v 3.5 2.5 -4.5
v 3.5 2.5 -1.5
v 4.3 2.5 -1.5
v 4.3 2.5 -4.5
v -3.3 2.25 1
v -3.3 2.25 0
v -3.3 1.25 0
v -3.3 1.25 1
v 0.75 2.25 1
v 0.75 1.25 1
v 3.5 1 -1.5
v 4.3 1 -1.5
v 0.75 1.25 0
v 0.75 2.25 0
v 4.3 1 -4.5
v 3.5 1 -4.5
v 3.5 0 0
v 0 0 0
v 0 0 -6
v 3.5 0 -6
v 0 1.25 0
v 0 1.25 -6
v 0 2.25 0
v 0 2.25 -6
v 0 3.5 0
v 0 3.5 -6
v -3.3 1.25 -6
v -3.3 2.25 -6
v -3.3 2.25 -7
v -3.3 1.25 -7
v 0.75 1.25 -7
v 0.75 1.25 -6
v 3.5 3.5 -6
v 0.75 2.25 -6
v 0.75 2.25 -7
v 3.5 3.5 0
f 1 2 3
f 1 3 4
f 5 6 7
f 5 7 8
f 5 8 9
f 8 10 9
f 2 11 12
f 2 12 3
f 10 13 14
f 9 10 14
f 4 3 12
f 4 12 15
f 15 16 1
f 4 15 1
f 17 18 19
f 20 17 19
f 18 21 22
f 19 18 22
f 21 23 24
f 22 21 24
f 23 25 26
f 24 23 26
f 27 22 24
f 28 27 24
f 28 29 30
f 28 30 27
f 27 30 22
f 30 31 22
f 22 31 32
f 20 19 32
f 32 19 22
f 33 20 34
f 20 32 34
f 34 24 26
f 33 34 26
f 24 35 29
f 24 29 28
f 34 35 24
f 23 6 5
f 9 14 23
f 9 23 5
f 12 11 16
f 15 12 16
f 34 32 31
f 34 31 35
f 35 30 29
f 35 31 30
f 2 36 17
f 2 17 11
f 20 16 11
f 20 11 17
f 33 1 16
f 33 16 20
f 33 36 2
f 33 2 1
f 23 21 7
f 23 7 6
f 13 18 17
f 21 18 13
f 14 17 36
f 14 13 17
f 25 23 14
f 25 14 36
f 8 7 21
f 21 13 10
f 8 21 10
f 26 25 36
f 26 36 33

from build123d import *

# Parameters (mm, degrees)
SKETCH1_W            = 6
SKETCH1_H            = 3.5
BOSS_EXTRUDE1_DEPTH  = 3.5
SKETCH2_W            = 3
SKETCH2_H            = 1.5
BOSS_EXTRUDE2_DEPTH  = 0.8
SKETCH7_W            = 0.75
SKETCH7_H            = 1
BOSS_EXTRUDE7_DEPTH  = 1
SKETCH8_W            = 1
SKETCH8_H            = 1
BOSS_EXTRUDE8_DEPTH  = 3.3
SKETCH9_W            = 0.75
SKETCH9_H            = 1
BOSS_EXTRUDE9_DEPTH  = 1
SKETCH10_W           = 1
SKETCH10_H           = 1
BOSS_EXTRUDE10_DEPTH = 3.3


with BuildPart() as part:
    # Sketch1 → Boss-Extrude1 (new body)
    with BuildSketch(Plane(origin=(0, 0, 0), x_dir=(0, 0, -1), z_dir=(1, 0, 0))):
        with Locations((3, 1.75)):
            Rectangle(SKETCH1_W, SKETCH1_H)
    extrude(amount=BOSS_EXTRUDE1_DEPTH)

    # Sketch2 → Boss-Extrude2 (add)
    with BuildSketch(Plane(origin=(3.5, 0, 0), x_dir=(0, 0, -1), z_dir=(1, 0, 0))):
        with Locations((3, 1.75)):
            Rectangle(SKETCH2_W, SKETCH2_H)
    extrude(amount=BOSS_EXTRUDE2_DEPTH)

    # Sketch7 → Boss-Extrude7 (add)
    with BuildSketch(Plane.XY):
        with Locations((0.375, 1.75)):
            Rectangle(SKETCH7_W, SKETCH7_H)
    extrude(amount=BOSS_EXTRUDE7_DEPTH)

    # Sketch8 → Boss-Extrude8 (add)
    with BuildSketch(Plane.ZY):
        with Locations((0.5, 1.75)):
            Rectangle(SKETCH8_W, SKETCH8_H)
    extrude(amount=BOSS_EXTRUDE8_DEPTH)

    # Sketch9 → Boss-Extrude9 (add)
    with BuildSketch(Plane(origin=(0, 0, -6), x_dir=(-1, 0, 0), z_dir=(0, 0, -1))):
        with Locations((-0.375, 1.75)):
            Rectangle(SKETCH9_W, SKETCH9_H)
    extrude(amount=BOSS_EXTRUDE9_DEPTH)

    # Sketch10 → Boss-Extrude10 (add)
    with BuildSketch(Plane.ZY):
        with Locations((-6.5, 1.75)):
            Rectangle(SKETCH10_W, SKETCH10_H)
    extrude(amount=BOSS_EXTRUDE10_DEPTH)


solid = part.part
